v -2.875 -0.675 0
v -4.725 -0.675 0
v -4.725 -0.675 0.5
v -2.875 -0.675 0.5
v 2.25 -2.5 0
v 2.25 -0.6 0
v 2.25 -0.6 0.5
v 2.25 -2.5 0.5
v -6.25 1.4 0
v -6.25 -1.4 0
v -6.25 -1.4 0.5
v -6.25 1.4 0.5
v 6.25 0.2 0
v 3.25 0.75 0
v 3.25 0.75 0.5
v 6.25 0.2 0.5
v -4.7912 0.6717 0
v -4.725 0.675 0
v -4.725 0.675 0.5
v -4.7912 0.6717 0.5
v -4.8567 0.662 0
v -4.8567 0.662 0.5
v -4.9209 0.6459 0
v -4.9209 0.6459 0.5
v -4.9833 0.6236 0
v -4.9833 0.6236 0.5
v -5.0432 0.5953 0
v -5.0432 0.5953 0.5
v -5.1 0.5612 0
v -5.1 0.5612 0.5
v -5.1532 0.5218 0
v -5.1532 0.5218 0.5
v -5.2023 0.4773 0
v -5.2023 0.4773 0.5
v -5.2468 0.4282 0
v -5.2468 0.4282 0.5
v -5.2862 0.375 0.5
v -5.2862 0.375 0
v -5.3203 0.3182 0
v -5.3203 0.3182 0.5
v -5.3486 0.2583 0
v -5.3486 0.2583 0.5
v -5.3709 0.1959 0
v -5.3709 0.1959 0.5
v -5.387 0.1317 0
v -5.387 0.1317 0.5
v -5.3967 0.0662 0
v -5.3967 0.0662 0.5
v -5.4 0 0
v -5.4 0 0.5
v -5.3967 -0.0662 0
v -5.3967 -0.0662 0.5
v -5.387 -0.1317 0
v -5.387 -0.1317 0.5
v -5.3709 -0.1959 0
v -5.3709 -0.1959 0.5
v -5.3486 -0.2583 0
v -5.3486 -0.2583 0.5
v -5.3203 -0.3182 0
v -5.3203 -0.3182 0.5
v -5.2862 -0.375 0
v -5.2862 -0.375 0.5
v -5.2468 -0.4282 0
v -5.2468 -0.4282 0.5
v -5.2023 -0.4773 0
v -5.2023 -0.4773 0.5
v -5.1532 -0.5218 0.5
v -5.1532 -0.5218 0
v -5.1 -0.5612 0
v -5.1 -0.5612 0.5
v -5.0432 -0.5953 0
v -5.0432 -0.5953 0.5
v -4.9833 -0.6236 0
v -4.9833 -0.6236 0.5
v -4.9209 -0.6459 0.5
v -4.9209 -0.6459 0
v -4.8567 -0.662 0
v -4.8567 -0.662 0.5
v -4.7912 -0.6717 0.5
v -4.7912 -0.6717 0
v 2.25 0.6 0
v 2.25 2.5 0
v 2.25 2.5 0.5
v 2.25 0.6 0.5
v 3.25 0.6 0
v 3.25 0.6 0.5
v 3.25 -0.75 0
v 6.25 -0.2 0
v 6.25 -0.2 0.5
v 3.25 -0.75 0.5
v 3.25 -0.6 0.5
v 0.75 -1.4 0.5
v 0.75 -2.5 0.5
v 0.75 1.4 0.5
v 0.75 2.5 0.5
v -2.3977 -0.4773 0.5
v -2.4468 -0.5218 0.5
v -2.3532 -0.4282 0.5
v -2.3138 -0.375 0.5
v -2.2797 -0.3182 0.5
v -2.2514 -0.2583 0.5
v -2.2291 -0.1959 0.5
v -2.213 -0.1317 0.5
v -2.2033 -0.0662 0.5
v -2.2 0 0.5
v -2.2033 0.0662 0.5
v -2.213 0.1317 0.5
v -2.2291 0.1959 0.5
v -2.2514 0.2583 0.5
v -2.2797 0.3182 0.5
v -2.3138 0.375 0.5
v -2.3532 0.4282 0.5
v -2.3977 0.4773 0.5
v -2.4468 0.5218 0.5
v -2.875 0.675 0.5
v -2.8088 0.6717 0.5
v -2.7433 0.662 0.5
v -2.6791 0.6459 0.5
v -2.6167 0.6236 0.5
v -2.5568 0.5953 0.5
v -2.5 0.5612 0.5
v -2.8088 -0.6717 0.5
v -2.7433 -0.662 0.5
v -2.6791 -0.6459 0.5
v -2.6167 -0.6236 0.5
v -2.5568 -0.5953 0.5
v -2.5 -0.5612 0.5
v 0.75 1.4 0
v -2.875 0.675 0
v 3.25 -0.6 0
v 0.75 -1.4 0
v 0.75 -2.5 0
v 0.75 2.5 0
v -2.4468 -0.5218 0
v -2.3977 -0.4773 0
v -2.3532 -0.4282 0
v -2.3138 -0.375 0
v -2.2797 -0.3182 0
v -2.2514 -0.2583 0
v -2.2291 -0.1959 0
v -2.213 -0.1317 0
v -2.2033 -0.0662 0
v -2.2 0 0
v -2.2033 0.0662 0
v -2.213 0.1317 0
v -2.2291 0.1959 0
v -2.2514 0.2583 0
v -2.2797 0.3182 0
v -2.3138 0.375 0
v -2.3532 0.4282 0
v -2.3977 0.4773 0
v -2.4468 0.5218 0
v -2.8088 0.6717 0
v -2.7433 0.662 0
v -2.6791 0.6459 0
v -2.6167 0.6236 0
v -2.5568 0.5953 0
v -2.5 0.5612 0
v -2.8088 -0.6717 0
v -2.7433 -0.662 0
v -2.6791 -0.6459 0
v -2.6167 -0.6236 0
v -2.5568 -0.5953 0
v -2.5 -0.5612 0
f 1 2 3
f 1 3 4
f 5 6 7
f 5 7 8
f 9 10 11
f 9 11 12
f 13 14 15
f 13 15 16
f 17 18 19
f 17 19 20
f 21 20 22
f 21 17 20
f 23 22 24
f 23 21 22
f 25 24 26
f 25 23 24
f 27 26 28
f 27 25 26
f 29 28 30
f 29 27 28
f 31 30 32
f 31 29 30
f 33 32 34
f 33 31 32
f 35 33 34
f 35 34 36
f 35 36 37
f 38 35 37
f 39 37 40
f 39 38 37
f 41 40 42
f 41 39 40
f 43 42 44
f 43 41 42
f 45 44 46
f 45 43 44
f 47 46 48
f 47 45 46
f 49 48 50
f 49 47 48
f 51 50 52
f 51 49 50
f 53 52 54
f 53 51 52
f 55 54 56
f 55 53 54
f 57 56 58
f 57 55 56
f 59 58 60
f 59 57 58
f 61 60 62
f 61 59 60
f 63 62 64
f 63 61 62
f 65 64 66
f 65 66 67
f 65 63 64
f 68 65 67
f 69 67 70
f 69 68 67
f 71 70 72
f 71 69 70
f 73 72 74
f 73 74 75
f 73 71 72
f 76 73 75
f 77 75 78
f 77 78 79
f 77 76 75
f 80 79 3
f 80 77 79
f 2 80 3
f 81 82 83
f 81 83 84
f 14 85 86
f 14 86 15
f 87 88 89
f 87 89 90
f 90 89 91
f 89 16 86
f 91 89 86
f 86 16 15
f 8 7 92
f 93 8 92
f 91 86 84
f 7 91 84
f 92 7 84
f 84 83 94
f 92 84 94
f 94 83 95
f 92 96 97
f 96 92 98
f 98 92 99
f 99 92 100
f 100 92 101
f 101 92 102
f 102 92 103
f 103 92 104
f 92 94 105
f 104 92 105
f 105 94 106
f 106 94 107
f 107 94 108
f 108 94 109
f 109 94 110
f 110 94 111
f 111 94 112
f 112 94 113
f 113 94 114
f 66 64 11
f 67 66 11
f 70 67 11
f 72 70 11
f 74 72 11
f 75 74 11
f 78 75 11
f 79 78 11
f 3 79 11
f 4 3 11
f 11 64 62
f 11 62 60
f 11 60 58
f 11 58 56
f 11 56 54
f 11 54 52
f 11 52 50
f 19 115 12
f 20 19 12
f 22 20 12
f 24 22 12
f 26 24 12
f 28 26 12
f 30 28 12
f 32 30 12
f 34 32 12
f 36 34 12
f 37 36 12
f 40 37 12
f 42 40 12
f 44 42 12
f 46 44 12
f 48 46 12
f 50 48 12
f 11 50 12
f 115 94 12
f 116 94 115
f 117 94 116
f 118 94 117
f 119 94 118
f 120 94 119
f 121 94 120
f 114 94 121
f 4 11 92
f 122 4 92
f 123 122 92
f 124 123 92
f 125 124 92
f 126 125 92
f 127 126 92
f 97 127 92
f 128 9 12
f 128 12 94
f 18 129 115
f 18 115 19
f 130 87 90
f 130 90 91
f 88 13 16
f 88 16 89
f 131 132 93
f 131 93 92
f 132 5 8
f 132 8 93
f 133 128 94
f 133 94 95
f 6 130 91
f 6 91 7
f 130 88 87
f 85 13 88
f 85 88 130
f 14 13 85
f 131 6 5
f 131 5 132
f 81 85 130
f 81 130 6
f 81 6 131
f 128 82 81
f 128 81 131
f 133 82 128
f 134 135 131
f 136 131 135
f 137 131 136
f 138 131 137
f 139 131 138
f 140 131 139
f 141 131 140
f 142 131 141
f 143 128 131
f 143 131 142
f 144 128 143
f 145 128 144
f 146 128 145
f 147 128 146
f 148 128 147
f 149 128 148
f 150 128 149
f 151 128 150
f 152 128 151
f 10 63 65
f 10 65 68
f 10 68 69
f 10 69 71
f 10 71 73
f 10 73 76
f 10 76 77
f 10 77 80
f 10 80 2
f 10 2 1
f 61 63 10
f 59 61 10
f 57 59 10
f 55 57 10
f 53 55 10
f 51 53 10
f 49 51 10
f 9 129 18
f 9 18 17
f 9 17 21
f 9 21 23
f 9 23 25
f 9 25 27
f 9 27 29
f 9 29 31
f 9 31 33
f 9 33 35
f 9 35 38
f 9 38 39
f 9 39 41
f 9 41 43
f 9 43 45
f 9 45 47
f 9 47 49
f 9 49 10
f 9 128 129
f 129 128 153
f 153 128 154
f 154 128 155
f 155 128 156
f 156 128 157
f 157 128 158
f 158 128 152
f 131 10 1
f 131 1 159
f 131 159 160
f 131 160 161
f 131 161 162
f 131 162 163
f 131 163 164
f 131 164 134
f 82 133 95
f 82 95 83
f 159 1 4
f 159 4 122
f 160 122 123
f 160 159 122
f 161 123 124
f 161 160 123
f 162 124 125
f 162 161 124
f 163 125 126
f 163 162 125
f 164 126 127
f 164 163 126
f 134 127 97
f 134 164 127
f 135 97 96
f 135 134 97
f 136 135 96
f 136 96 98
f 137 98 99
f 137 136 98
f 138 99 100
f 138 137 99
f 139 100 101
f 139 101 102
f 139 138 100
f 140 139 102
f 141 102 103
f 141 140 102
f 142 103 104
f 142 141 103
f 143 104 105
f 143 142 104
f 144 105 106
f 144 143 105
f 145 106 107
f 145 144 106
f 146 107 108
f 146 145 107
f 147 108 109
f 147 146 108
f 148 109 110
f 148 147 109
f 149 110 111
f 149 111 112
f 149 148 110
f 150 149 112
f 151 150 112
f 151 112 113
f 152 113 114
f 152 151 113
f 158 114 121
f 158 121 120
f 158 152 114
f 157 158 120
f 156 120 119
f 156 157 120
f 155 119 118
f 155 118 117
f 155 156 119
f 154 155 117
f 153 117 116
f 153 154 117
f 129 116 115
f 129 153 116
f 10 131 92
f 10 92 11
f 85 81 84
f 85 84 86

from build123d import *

# Parameters (mm, degrees)
BOSS_EXTRUDE1_DEPTH = 0.5


with BuildPart() as part:
    # Sketch2 → Boss-Extrude1 (new body)
    with BuildSketch(Plane.XY):
        Polygon((-6.25, -1.4), (-6.25, 1.4), (0.75, 1.4), (0.75, 2.5), (2.25, 2.5), (2.25, 0.6), (3.25, 0.6), (3.25, 0.75), (6.25, 0.2), (6.25, -0.2), (3.25, -0.75), (3.25, -0.6), (2.25, -0.6), (2.25, -2.5), (0.75, -2.5), (0.75, -1.4), align=None)
        with BuildLine():
            Line((-2.875, 0.675), (-4.725, 0.675))
            ThreePointArc((-4.725, 0.675), (-5.4, 0), (-4.725, -0.675))
            Line((-4.725, -0.675), (-2.875, -0.675))
            ThreePointArc((-2.875, -0.675), (-2.2, 0), (-2.875, 0.675))
        make_face(mode=Mode.SUBTRACT)
    extrude(amount=BOSS_EXTRUDE1_DEPTH)


solid = part.part
